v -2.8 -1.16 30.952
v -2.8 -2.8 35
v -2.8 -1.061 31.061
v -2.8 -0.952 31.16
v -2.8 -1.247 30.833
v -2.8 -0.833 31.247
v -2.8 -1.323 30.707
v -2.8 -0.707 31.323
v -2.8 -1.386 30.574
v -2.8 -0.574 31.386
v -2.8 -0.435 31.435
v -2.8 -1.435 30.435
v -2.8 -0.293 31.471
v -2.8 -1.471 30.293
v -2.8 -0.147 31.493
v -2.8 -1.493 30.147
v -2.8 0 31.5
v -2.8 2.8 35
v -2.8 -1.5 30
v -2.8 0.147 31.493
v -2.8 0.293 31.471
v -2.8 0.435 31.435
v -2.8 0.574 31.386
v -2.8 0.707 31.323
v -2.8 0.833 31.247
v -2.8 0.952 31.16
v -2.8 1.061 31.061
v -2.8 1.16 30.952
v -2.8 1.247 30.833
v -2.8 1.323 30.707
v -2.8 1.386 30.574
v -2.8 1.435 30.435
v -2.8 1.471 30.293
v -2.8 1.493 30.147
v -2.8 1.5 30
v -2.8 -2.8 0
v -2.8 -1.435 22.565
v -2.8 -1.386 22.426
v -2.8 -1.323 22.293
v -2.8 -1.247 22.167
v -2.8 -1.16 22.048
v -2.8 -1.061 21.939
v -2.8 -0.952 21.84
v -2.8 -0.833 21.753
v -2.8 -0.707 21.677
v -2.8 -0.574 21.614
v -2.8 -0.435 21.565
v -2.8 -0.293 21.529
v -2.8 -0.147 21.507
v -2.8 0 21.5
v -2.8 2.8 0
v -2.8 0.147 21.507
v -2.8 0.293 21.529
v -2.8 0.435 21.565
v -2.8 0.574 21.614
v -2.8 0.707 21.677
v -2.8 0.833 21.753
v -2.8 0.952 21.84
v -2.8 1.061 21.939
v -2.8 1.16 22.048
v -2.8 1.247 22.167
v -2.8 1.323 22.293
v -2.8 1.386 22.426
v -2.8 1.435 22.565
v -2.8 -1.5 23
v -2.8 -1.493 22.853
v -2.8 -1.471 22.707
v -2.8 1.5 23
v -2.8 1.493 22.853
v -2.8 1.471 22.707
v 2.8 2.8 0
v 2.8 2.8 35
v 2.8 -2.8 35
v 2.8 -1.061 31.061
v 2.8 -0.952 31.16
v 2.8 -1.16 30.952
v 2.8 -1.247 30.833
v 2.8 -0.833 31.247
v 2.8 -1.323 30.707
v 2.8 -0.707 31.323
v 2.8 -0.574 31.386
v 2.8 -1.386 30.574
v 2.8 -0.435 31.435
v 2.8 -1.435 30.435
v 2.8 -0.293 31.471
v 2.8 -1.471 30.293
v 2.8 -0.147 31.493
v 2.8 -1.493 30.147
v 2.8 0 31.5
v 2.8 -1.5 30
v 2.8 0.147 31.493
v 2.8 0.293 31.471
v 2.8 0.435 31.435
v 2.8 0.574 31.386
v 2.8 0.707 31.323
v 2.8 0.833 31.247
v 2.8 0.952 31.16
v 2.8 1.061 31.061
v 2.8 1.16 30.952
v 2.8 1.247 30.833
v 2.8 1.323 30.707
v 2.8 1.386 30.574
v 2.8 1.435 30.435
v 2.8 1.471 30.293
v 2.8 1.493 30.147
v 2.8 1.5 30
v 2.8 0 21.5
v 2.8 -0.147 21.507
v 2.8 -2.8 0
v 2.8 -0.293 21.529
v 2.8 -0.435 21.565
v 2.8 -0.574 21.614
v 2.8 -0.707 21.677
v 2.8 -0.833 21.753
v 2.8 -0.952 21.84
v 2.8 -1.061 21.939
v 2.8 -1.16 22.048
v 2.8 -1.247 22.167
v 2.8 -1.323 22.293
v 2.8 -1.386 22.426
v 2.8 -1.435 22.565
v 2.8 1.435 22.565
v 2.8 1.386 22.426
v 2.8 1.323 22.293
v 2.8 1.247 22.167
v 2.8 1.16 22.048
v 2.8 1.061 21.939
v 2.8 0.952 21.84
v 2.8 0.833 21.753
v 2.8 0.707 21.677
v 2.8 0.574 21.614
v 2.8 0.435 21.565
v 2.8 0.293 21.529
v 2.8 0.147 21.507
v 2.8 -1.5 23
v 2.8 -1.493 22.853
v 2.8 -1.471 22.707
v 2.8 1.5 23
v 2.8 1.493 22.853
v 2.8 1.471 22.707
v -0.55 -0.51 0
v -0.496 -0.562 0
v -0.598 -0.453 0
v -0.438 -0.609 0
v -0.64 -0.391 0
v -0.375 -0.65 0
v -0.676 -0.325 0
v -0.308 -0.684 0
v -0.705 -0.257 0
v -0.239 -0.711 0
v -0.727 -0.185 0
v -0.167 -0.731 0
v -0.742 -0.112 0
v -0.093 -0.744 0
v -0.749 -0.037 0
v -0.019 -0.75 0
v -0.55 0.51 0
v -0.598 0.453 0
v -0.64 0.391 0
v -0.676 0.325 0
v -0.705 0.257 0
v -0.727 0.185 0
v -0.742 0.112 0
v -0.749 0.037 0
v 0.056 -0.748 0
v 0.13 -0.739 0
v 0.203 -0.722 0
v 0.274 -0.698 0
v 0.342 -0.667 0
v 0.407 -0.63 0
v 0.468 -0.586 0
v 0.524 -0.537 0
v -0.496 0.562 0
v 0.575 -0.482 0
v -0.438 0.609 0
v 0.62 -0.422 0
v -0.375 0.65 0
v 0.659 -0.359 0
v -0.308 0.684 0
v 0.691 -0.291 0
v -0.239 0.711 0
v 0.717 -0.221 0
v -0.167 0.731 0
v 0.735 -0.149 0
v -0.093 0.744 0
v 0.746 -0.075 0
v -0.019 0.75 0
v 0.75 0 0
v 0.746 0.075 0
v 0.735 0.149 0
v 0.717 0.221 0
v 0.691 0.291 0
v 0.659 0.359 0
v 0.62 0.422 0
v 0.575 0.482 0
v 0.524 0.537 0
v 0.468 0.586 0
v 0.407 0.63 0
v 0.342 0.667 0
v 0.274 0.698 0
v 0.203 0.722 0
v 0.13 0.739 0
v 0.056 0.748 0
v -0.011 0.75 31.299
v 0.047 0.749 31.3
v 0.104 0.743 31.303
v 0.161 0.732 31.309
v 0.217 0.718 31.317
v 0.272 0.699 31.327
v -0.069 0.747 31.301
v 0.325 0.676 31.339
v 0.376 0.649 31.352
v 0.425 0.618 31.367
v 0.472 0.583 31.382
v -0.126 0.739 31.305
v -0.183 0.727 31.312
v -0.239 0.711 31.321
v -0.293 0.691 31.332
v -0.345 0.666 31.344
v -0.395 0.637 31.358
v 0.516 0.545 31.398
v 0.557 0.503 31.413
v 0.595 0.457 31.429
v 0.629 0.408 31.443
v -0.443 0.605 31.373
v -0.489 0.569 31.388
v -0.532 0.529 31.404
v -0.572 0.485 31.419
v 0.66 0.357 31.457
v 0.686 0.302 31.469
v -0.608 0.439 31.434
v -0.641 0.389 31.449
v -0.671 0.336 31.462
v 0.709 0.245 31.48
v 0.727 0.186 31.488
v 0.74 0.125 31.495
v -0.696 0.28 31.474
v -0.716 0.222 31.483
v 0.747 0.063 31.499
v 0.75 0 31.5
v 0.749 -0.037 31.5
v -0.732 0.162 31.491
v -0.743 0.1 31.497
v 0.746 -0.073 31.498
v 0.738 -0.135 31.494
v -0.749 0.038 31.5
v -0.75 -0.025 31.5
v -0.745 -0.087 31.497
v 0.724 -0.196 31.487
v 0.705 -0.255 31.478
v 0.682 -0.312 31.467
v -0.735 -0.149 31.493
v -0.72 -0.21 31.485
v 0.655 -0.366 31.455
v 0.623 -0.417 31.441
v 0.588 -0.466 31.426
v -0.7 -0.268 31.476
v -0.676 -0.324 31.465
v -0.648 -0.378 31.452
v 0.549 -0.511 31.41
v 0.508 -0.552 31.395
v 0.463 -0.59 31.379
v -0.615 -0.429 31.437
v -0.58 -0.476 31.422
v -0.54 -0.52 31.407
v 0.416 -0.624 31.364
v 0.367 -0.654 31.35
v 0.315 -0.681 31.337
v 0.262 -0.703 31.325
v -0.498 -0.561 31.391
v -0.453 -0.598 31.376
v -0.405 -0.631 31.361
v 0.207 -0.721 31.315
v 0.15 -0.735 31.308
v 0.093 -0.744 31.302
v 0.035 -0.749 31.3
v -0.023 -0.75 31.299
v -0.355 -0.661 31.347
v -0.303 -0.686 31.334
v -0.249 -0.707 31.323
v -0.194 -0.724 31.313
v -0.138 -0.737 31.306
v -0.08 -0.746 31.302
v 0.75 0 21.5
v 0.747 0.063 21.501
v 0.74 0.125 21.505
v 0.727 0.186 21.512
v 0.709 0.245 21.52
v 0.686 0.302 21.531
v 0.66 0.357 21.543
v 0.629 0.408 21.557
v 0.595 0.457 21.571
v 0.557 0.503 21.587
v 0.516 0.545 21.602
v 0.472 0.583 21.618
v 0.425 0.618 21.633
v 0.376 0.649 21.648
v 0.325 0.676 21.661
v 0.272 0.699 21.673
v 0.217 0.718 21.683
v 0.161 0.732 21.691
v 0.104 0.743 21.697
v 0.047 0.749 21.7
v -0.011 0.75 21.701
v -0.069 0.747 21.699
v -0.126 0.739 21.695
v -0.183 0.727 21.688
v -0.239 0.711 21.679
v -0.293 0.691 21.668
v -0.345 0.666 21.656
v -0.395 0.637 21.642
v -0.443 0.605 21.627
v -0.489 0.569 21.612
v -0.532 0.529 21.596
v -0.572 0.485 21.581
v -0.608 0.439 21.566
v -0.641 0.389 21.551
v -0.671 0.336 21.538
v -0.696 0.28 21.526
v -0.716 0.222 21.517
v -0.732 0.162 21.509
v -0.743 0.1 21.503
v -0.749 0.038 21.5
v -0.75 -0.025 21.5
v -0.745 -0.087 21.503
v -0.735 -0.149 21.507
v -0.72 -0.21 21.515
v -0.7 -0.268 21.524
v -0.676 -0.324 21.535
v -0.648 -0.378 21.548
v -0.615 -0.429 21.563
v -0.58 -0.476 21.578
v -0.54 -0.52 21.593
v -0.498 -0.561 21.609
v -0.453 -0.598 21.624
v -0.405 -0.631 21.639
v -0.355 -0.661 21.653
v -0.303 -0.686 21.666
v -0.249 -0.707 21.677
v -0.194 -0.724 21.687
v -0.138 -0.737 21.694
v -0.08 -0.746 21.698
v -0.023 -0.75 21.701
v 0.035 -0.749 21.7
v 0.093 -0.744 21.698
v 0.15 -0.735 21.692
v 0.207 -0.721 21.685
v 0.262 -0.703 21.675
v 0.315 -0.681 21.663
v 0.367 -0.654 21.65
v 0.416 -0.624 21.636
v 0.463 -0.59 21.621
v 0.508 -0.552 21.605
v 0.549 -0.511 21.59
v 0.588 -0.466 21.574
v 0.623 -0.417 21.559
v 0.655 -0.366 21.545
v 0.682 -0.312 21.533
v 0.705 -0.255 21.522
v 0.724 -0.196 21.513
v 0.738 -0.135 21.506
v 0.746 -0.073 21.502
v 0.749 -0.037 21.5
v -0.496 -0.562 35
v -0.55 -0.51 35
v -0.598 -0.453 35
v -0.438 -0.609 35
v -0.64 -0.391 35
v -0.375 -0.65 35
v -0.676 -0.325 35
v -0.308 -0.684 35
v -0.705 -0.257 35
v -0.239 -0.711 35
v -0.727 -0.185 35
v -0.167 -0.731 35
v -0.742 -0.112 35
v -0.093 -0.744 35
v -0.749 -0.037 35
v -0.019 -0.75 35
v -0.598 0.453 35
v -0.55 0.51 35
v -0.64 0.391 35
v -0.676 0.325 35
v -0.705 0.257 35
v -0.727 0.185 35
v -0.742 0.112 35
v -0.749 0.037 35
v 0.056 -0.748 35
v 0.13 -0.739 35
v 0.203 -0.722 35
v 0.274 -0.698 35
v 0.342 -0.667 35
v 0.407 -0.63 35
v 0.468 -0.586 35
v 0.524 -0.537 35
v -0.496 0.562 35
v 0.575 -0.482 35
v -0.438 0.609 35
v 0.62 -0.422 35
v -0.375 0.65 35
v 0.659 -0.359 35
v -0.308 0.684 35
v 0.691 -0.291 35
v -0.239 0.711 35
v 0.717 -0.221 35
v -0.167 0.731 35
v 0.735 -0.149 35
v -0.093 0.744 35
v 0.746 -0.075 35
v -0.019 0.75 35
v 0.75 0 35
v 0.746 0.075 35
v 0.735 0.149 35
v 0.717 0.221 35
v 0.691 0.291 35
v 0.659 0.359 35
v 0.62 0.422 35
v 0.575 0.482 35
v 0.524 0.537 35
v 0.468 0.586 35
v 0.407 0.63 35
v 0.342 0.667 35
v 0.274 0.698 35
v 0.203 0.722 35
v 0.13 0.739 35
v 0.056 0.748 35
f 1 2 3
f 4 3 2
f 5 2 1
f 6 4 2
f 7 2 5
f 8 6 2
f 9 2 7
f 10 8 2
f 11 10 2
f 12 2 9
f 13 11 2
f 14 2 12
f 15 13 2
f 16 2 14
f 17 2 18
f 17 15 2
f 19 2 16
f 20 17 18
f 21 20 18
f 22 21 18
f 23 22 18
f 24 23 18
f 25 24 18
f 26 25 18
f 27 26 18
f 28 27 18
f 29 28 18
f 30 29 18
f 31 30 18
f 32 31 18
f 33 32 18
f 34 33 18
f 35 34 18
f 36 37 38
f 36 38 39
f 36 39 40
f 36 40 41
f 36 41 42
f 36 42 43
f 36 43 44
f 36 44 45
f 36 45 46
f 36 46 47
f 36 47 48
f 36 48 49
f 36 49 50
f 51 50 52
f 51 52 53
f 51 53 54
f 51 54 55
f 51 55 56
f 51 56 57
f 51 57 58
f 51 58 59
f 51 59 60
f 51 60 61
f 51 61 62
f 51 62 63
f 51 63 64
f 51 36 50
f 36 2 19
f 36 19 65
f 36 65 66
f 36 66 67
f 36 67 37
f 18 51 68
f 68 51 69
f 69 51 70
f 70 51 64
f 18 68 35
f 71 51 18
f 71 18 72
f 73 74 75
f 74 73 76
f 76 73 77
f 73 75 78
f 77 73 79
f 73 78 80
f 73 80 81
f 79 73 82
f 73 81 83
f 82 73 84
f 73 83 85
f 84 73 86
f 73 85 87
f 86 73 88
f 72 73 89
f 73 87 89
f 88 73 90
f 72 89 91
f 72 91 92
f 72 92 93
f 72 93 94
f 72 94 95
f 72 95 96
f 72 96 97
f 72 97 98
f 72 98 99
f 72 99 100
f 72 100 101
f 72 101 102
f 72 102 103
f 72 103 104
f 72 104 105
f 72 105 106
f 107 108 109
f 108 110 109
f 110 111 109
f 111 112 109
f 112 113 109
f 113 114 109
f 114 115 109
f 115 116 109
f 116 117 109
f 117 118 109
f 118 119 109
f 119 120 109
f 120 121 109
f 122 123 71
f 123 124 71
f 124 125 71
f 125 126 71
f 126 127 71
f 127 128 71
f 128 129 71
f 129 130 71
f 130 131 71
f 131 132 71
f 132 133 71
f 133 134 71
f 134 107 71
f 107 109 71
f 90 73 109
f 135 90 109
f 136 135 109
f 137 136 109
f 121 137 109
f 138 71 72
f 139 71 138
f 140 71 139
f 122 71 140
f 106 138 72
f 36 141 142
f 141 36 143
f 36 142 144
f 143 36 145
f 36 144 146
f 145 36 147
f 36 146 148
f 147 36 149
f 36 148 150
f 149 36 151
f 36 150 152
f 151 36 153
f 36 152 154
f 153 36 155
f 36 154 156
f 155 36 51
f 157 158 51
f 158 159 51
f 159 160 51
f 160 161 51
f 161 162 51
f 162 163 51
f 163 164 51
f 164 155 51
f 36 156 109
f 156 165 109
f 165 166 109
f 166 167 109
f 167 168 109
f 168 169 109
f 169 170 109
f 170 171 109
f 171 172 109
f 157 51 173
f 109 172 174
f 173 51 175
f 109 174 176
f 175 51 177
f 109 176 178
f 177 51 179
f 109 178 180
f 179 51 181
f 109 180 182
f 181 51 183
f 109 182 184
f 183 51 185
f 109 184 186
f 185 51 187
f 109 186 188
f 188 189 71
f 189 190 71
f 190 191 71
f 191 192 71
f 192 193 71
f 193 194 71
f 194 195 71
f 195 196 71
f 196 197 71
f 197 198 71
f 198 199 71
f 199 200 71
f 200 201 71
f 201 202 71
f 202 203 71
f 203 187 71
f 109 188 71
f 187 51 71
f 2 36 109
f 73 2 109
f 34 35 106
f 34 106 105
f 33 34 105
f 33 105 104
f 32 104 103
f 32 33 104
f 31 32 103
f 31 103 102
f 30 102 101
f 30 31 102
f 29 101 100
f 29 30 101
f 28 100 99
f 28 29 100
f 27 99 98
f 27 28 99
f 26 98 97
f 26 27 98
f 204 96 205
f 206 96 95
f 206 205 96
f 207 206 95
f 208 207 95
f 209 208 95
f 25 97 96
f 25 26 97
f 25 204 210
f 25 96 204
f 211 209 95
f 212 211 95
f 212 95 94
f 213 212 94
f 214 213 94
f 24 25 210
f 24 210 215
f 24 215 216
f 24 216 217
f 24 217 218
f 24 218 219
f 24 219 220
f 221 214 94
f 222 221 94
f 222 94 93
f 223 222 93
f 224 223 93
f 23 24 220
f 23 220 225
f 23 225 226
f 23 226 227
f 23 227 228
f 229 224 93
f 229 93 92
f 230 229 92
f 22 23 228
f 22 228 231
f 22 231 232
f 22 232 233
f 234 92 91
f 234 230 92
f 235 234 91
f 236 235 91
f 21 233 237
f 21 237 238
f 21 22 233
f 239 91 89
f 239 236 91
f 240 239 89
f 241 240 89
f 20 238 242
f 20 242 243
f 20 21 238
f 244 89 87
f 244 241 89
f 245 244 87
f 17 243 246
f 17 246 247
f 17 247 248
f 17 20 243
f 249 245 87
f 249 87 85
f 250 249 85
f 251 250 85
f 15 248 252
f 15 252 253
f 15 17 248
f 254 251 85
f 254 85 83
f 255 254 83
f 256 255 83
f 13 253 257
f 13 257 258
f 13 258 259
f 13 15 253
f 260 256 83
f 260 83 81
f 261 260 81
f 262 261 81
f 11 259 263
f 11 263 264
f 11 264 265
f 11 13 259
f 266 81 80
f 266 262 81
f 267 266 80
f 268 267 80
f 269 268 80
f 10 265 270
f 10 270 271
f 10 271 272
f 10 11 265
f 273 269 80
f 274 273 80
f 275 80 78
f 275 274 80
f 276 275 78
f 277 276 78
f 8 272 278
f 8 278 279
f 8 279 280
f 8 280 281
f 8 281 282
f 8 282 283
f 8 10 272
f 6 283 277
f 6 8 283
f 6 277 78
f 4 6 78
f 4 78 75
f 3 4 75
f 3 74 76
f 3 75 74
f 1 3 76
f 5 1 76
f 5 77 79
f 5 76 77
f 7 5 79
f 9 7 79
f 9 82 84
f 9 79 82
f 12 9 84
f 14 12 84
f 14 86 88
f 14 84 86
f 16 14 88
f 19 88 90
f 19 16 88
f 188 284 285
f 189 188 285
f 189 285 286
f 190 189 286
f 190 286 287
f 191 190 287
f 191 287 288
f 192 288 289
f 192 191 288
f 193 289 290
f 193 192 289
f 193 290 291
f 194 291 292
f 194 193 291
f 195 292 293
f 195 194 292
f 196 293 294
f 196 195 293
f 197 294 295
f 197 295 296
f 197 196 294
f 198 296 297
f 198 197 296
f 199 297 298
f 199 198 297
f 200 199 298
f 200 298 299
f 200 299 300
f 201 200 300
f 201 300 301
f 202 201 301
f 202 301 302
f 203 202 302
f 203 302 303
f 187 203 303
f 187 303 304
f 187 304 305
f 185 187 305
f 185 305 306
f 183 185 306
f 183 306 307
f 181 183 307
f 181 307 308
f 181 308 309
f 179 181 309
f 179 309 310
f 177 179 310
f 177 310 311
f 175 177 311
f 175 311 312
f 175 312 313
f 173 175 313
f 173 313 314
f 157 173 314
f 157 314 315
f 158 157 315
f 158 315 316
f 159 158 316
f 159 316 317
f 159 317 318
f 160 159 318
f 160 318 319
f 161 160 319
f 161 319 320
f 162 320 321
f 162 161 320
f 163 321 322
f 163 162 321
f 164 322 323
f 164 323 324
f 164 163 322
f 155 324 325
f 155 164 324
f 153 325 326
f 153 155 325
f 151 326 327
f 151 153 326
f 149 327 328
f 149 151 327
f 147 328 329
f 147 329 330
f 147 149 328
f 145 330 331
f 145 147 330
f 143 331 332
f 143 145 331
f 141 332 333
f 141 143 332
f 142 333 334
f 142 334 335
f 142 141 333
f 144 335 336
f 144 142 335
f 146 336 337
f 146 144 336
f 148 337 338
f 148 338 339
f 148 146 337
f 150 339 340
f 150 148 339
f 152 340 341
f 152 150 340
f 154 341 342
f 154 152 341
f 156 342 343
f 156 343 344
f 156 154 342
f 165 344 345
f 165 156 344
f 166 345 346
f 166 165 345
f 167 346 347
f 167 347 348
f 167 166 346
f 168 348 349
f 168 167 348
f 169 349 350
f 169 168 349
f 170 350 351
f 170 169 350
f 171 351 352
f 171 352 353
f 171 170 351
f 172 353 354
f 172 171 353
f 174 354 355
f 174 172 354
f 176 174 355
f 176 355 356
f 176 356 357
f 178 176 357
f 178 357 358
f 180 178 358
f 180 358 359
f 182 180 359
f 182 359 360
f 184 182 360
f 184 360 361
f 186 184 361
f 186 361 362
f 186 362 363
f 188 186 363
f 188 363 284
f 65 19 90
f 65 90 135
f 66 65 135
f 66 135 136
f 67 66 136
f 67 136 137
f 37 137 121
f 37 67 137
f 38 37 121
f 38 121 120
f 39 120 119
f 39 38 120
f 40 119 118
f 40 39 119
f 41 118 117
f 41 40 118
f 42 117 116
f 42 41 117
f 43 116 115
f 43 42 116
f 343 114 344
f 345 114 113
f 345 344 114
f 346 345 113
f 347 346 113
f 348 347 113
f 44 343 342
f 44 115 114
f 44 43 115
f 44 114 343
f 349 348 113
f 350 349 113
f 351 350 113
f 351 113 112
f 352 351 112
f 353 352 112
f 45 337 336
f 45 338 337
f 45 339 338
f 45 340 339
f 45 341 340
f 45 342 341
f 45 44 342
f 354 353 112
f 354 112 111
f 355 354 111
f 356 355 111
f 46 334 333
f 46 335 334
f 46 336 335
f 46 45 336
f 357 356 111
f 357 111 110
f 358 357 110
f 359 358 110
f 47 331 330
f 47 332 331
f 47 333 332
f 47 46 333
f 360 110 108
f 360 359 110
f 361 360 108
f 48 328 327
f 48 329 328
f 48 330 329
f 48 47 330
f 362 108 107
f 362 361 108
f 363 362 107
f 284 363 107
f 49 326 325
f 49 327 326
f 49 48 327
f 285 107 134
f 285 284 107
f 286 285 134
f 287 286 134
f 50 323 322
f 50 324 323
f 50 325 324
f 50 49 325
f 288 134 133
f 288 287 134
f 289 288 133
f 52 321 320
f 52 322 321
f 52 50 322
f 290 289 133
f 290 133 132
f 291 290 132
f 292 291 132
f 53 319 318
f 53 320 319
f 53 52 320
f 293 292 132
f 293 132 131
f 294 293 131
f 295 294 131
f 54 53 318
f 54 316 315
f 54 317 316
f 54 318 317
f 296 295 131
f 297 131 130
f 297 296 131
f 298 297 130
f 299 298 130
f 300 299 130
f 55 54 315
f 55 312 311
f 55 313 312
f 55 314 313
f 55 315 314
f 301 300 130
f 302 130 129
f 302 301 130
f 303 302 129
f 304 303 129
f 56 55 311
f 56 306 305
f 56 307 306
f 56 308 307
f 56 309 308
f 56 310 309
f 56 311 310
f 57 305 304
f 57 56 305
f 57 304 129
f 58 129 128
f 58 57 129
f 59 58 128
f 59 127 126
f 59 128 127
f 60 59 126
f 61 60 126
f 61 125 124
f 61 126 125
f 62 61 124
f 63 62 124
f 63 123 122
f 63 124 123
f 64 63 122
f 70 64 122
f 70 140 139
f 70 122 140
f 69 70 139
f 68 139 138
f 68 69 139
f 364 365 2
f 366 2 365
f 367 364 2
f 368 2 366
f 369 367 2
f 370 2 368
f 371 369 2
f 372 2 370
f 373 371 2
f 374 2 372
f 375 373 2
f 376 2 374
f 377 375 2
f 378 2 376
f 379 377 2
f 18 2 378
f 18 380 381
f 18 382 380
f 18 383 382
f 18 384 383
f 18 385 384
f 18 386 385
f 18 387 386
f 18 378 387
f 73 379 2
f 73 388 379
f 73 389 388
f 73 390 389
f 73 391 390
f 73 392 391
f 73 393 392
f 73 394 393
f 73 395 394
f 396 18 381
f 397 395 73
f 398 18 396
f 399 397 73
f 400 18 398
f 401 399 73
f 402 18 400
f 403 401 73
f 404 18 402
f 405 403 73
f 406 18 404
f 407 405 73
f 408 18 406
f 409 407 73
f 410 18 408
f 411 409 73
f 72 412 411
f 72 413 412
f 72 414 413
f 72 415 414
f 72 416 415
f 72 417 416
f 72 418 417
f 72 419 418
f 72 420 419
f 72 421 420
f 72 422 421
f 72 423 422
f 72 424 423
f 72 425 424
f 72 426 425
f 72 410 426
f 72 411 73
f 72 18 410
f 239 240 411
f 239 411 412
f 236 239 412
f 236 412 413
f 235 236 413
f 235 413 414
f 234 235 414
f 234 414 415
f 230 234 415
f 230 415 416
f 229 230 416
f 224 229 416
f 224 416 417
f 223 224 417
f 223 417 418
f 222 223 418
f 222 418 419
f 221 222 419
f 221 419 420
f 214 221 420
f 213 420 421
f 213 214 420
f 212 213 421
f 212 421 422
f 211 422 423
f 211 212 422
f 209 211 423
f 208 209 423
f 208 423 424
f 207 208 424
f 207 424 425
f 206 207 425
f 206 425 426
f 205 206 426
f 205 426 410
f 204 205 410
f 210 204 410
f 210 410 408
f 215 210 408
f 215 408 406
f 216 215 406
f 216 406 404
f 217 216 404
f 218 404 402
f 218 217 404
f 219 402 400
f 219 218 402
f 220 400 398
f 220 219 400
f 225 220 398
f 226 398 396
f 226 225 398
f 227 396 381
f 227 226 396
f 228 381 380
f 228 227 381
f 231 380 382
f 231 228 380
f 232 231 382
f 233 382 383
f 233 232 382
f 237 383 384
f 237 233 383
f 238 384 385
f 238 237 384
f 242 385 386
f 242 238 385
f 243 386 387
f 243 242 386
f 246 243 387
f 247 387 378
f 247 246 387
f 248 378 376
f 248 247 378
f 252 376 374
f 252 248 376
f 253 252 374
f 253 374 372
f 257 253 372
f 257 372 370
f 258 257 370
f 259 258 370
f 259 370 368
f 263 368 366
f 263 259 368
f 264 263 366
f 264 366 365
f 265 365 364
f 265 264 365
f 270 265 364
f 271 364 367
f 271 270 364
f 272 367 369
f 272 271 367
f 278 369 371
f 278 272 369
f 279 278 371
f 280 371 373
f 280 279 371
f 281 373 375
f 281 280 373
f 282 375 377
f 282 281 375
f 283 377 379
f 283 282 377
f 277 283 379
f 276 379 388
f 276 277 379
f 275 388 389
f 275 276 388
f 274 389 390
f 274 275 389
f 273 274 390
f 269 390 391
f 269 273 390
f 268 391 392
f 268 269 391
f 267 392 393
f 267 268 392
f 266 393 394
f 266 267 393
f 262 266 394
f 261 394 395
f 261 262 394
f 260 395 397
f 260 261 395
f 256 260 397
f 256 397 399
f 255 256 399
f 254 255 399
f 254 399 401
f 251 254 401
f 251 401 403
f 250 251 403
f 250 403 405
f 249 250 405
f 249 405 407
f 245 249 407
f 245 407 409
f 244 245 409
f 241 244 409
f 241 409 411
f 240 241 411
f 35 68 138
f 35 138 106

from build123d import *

# Parameters (mm, degrees)
SKETCH1_W           = 5.6
SKETCH1_H           = 5.6
SKETCH1_R           = 0.75
BOSS_EXTRUDE1_DEPTH = 35
CUT_EXTRUDE1_DEPTH  = 36.555590278


with BuildPart() as part:
    # Sketch1 → Boss-Extrude1 (new body)
    with BuildSketch(Plane.XY):
        Rectangle(SKETCH1_W, SKETCH1_H)
        Circle(SKETCH1_R, mode=Mode.SUBTRACT)
    extrude(amount=BOSS_EXTRUDE1_DEPTH)

    # Sketch2 → Cut-Extrude1 (cut, through all)
    with BuildSketch(Plane.ZY.offset(2.8)):
        with BuildLine():
            Line((23, 1.5), (30, 1.5))
            ThreePointArc((30, 1.5), (31.5, 0), (30, -1.5))
            Line((30, -1.5), (23, -1.5))
            ThreePointArc((23, -1.5), (21.5, 0), (23, 1.5))
        make_face()
    extrude(amount=-CUT_EXTRUDE1_DEPTH, mode=Mode.SUBTRACT)


solid = part.part
